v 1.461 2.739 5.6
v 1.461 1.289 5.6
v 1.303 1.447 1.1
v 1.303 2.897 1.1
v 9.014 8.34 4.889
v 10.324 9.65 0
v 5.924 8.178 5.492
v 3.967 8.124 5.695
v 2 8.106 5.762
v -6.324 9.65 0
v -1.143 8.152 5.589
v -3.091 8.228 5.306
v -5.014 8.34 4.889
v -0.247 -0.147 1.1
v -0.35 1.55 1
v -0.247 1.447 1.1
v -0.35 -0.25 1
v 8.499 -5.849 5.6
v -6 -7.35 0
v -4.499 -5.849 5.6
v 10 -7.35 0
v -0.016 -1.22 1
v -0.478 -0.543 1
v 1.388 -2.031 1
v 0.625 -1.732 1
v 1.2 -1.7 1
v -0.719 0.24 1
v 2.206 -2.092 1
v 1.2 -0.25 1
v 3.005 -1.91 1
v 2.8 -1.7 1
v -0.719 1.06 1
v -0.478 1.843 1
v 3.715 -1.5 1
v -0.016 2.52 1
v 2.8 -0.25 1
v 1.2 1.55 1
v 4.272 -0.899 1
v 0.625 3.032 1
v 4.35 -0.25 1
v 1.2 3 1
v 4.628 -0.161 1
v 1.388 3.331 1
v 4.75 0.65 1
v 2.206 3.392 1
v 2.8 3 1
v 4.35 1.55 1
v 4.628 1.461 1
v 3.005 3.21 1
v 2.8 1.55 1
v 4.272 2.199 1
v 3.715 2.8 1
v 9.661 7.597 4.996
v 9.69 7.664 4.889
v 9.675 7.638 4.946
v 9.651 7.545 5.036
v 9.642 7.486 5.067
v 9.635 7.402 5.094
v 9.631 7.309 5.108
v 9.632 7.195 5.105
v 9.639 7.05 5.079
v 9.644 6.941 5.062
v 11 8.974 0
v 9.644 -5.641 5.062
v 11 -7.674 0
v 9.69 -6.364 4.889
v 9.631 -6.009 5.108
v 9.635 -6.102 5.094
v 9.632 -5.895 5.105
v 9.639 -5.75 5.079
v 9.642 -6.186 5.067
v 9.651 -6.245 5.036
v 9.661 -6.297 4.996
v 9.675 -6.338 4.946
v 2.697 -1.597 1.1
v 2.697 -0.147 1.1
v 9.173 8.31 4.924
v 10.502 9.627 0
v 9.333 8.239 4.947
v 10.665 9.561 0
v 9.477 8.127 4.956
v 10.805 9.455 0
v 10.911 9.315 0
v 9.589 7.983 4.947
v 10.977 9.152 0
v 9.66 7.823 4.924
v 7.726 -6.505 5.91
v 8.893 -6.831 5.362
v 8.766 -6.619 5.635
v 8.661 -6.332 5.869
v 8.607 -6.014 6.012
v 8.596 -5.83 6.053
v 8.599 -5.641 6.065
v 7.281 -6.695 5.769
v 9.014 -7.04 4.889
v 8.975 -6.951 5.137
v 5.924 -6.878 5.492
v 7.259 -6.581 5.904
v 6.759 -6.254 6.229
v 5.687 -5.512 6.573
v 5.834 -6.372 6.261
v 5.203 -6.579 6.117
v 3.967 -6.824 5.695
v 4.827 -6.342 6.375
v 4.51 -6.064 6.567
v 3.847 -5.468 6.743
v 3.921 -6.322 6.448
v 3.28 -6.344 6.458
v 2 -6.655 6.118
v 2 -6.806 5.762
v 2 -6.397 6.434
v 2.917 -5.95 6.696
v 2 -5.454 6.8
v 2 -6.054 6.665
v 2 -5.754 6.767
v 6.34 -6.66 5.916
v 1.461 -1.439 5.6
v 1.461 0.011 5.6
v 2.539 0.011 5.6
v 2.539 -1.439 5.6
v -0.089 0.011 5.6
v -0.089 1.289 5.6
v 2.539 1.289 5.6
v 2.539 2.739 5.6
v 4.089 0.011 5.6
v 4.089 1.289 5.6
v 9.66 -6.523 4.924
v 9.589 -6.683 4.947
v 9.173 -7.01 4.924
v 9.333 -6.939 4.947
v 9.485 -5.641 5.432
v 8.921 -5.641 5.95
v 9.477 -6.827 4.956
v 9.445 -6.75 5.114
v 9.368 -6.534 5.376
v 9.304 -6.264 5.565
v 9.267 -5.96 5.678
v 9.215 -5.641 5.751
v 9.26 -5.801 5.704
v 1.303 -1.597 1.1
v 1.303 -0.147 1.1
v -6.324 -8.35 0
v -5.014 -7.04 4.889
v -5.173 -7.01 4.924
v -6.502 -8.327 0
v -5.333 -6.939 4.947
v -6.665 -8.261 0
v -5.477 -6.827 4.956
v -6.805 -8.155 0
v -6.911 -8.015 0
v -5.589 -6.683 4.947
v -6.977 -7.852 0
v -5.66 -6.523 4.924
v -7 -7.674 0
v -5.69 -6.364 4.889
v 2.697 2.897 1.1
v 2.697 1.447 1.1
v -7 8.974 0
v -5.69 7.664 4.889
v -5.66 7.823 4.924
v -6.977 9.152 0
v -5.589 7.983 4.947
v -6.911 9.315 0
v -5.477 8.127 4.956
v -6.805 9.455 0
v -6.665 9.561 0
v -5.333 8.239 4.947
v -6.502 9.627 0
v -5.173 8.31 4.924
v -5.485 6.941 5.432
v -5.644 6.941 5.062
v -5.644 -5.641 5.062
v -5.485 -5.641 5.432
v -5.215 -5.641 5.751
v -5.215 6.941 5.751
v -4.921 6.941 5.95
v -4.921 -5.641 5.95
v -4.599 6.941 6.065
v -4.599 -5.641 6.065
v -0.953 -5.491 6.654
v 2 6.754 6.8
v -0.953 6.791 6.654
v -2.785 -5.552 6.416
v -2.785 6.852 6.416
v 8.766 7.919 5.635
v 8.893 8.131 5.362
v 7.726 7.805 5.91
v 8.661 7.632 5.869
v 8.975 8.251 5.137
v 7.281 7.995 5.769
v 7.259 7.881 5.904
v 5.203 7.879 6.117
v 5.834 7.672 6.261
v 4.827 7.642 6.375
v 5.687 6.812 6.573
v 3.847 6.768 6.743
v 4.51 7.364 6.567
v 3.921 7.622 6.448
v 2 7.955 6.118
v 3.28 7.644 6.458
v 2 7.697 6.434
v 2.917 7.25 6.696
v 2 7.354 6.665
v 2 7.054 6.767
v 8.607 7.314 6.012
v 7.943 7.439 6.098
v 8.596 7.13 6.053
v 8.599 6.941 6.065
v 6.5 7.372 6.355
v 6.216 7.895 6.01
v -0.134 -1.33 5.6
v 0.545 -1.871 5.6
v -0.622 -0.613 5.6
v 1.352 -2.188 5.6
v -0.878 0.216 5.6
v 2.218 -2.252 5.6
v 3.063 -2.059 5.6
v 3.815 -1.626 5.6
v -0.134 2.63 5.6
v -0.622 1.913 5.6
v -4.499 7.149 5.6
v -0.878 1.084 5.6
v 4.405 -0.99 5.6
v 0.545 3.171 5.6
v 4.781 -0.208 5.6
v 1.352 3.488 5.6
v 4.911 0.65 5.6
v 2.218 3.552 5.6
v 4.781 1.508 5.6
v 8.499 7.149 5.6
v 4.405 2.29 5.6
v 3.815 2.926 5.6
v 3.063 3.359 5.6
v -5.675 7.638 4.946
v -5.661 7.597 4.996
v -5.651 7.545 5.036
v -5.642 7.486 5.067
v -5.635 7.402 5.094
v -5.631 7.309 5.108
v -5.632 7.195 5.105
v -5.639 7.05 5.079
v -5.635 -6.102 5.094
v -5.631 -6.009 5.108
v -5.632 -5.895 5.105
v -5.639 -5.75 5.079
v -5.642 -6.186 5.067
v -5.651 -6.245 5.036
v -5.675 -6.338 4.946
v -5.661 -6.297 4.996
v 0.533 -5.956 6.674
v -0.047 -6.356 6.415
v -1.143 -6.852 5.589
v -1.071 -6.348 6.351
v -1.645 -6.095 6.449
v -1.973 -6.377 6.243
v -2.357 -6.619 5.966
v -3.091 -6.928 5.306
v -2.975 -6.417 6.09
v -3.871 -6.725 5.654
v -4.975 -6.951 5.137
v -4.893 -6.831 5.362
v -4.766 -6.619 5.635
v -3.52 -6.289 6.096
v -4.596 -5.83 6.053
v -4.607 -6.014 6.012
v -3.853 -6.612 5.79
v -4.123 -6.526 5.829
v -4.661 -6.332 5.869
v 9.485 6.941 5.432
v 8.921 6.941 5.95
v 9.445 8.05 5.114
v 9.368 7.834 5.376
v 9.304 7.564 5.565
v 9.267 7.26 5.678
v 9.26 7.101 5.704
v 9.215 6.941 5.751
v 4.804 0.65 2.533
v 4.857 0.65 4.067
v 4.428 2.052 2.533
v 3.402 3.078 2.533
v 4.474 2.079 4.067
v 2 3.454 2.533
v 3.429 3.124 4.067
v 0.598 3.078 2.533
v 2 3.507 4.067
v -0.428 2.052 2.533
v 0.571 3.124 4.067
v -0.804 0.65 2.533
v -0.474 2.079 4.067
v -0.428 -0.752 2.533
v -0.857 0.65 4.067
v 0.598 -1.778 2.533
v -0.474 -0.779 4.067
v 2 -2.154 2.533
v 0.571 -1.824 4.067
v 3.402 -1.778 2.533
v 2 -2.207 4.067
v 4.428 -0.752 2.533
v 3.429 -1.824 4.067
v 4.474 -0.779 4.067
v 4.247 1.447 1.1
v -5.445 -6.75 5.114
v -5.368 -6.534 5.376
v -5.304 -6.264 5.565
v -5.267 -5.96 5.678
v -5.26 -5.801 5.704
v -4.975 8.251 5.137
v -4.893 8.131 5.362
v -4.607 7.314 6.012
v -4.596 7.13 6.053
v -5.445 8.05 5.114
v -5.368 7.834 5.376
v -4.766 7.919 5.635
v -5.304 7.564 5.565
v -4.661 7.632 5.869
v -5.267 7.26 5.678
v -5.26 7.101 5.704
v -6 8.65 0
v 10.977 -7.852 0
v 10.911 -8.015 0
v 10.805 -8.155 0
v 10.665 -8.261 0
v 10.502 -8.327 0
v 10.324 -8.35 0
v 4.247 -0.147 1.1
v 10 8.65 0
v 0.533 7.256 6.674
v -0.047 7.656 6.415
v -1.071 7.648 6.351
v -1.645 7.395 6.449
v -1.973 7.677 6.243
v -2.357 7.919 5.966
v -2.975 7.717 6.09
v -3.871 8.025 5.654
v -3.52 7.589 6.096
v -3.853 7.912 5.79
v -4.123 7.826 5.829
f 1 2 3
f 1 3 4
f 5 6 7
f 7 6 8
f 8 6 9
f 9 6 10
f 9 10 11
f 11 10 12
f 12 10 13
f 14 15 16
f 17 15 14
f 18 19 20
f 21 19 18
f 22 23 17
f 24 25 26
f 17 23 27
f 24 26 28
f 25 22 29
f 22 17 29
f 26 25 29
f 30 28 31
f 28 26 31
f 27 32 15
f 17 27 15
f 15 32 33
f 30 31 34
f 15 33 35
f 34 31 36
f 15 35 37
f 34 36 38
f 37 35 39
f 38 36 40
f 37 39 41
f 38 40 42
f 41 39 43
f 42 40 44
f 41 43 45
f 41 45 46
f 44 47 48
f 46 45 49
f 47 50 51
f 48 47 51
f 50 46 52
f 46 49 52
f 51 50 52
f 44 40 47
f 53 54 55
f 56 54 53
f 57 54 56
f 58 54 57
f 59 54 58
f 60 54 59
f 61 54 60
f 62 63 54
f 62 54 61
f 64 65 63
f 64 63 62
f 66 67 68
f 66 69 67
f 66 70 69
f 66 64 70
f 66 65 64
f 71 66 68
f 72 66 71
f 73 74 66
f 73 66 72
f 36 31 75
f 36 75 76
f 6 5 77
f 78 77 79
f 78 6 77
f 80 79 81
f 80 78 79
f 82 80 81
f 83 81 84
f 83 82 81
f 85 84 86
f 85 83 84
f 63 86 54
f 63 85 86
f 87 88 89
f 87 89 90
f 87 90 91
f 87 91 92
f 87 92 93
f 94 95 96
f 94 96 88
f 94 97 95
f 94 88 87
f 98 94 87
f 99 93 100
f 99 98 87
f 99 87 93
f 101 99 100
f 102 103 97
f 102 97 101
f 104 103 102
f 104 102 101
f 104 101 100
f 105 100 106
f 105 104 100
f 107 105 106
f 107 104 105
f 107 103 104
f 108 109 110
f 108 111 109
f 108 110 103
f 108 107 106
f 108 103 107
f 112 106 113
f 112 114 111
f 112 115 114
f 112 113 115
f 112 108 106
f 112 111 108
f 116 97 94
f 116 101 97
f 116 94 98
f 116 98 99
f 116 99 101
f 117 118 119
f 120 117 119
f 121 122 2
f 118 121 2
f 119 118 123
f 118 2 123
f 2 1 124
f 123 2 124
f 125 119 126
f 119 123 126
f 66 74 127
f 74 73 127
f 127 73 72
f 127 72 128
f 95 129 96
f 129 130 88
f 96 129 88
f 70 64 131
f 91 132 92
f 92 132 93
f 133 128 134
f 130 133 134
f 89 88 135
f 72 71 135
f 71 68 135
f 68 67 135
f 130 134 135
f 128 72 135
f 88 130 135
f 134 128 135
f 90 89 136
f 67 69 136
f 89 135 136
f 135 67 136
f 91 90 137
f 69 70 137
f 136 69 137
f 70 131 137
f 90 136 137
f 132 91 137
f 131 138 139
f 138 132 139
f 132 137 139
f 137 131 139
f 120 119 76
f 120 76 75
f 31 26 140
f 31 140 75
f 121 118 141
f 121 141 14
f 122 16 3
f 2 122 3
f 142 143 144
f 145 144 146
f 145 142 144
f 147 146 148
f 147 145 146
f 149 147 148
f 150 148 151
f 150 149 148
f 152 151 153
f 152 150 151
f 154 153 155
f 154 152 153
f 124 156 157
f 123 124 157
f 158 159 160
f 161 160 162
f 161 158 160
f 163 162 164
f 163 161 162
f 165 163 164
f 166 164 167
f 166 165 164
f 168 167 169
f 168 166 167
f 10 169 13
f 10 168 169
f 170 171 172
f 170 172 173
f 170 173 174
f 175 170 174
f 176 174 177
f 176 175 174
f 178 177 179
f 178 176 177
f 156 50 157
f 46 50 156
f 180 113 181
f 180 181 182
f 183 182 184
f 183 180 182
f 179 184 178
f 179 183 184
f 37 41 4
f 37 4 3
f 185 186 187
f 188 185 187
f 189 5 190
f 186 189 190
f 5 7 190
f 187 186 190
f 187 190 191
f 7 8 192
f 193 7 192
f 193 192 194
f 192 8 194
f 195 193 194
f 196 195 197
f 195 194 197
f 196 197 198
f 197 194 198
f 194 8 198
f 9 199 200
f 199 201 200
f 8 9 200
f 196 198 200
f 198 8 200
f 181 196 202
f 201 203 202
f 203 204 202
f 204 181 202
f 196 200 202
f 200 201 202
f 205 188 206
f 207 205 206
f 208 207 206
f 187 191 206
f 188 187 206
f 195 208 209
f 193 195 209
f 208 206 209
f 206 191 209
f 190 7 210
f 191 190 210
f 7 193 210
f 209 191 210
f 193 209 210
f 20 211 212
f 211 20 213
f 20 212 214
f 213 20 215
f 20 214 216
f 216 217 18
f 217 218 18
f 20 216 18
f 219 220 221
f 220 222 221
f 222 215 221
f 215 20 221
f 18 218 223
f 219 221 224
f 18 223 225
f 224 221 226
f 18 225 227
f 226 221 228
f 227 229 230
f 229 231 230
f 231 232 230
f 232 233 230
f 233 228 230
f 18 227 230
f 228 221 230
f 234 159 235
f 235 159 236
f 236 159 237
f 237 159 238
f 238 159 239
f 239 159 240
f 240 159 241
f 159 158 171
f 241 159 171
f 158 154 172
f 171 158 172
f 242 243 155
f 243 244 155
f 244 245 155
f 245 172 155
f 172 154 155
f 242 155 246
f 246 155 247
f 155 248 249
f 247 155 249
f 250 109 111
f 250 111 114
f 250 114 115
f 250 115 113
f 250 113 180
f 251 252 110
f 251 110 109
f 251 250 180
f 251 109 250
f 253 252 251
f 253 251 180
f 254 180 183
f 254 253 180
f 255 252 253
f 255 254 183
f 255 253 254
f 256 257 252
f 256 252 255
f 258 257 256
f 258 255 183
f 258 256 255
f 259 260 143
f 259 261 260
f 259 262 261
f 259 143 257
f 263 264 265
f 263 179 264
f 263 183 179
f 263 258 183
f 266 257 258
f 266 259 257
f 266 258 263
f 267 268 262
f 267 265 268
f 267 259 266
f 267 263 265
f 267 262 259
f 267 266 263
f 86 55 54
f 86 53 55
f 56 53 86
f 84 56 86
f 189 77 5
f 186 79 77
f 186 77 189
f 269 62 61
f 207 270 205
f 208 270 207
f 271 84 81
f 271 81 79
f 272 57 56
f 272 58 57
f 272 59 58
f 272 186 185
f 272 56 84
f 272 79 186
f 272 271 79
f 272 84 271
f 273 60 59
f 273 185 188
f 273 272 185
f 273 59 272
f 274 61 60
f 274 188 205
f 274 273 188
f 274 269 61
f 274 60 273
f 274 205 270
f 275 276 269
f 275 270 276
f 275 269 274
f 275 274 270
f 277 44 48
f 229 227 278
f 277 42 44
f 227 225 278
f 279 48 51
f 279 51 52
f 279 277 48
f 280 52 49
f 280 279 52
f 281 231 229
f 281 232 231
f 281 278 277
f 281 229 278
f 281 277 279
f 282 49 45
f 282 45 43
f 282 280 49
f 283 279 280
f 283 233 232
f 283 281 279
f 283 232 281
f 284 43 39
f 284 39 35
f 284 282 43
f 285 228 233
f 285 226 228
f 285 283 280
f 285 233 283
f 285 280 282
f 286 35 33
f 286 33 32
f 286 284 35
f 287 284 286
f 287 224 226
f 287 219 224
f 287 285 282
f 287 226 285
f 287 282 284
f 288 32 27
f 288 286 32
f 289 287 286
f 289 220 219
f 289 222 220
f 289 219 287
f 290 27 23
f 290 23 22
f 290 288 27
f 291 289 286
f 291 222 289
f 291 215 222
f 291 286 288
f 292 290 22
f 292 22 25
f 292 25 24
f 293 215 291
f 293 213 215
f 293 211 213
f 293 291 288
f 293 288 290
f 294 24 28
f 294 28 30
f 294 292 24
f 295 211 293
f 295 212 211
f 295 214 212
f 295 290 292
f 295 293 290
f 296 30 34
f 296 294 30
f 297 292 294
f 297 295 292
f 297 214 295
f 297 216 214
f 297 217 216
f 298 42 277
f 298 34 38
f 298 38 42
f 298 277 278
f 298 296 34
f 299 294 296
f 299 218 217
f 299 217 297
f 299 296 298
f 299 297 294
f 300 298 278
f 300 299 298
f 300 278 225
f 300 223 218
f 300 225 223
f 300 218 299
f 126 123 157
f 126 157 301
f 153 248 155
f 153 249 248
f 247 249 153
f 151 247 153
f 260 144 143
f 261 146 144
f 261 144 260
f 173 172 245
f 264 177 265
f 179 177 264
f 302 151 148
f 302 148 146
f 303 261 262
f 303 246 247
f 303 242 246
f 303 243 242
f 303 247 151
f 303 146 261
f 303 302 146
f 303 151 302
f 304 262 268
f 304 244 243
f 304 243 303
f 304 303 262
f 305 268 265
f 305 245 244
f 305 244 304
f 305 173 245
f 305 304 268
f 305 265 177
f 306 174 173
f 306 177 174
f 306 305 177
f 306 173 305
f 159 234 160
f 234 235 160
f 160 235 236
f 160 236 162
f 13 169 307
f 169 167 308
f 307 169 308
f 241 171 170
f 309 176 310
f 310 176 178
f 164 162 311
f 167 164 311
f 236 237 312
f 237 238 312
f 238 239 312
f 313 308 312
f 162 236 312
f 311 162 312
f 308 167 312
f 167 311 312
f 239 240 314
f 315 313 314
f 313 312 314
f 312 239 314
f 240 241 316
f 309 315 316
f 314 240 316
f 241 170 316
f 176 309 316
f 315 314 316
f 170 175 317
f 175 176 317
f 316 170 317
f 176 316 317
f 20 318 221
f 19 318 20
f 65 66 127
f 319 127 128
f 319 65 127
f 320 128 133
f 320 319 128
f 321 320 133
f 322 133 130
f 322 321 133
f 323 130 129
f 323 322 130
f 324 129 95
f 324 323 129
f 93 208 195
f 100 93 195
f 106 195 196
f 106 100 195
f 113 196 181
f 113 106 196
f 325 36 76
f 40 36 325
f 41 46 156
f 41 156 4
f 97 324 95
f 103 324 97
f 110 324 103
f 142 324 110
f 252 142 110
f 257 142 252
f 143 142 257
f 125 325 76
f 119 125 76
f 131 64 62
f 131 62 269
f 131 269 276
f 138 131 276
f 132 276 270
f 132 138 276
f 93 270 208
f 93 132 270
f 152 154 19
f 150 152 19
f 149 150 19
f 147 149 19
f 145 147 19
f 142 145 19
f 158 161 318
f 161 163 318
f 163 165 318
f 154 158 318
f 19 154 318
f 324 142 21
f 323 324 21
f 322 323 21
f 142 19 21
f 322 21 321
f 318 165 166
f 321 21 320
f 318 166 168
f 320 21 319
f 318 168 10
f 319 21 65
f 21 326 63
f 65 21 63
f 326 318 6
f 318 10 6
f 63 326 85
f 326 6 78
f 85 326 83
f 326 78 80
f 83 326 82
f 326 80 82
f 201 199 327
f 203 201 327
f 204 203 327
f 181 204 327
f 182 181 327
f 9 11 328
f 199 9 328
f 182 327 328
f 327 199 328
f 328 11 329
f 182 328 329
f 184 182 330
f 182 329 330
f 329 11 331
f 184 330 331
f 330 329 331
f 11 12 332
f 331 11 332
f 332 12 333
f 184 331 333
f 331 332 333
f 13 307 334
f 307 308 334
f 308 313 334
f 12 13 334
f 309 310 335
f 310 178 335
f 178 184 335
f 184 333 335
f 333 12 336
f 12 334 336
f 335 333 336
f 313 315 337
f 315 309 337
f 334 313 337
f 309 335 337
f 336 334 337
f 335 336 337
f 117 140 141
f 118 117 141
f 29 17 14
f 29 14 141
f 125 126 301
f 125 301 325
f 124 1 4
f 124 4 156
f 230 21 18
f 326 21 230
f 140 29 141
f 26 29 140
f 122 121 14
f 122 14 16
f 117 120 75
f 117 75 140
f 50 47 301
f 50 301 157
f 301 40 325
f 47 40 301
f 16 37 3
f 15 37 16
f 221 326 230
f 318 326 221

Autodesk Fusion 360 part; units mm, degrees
sketch "Stem dimensions" plane through (0, 0, 0) normal (0, 0, 1) x (1, 0, 0)
  line L0 (0, 0) -> (4, 0)
  line L1 (4, 0) -> (4, 1.3)
  line L2 (4, 1.3) -> (0, 1.3)
  line L3 (0, 1.3) -> (0, 0)
  line L4 (1.45, 2.65) -> (2.55, 2.65)
  line L5 (2.55, 2.65) -> (2.55, -1.35)
  line L6 (2.55, -1.35) -> (1.45, -1.35)
  line L7 (1.45, -1.35) -> (1.45, 2.65)
  line L8 (0, 1.3) -> (4, 0) construction
  line L9 (0, 0) -> (4, 1.3) construction
  line L10 (2, -1.35) -> (2, 2.65) construction
  line L11 (2.55, 0.65) -> (1.45, 0.65) construction
  point P0 (2, 0.65)
  point P1 (2, 0.65)
  point P2 (2, 0.65)
  dimension "d1" = 4
  dimension "d2" = 1.3
  dimension "d3" = 1.1
  dimension "d4" = 4
sketch "Stem clearance" plane through (0, 0, 0) normal (0, 0, 1) x (1, 0, 0)
  line L0 (4, 1.3) -> (0, 1.3) construction
  line L1 (1.45, -1.35) -> (1.45, 2.65) construction
  line L2 (1.45, 2.65) -> (2.55, 2.65) construction
  line L3 (2.55, 2.65) -> (2.55, -1.35) construction
  line L4 (4, 0) -> (4, 1.3) construction
  line L5 (0, 0) -> (4, 0) construction
  line L6 (2.55, -1.35) -> (1.45, -1.35) construction
  line L7 (0, 1.3) -> (0, 0) construction
  line L8 (-0.25, 1.45) -> (1.3, 1.45)
  line L9 (1.3, 1.45) -> (1.3, 2.9)
  line L10 (1.3, 2.9) -> (2.7, 2.9)
  line L11 (2.7, 2.9) -> (2.7, 1.45)
  line L12 (2.7, 1.45) -> (4.25, 1.45)
  line L13 (4.25, 1.45) -> (4.25, -0.15)
  line L14 (4.25, -0.15) -> (2.7, -0.15)
  line L15 (2.7, -0.15) -> (2.7, -1.6)
  line L16 (2.7, -1.6) -> (1.3, -1.6)
  line L17 (1.3, -1.6) -> (1.3, -0.15)
  line L18 (1.3, -0.15) -> (-0.25, -0.15)
  line L19 (-0.25, -0.15) -> (-0.25, 1.45)
  circle A0 centre (2, 0.65) radius 2.75
  point P0 (2, 0.65)
  dimension "gap" = 0.15
  dimension "gap_edge" = 0.25
  dimension "d7" = 0.15
  dimension "d8" = 0.25
  dimension "d9" = 0.25
  dimension "d10" = 0.25
  dimension "d11" = 0.15
  dimension "d12" = 0.15
  dimension "d13" = 5.5
ref_plane "WorkPlane1" through (2, 0.65, 0) normal (1, 0, 0) x (0, 1, 0)
sketch "Stem - vertical" plane through (2, 0, 0) normal (1, 0, 0) x (0, 1, 0)
  line L0 (-1.35, 0) -> (2.65, 0) construction
  line L1 (0.65, 0) -> (0.65, 5.6)
  point P0 (0.65, 1)
  point P1 (0.65, 0)
  dimension "d16" = 1
  dimension "d28" = 4.6
extrude "Extrude1" add sketch "Stem clearance" along normal up to surface (4.6 mm away) draft 2 from surface at 1 makes body 1
chamfer "Chamfer1" distance 0.1 angle 45 12 edges at (1.3, -0.875, 1) (2, -1.6, 1) (2.7, -0.875, 1) (3.475, -0.15, 1) (4.25, 0.65, 1) (3.475, 1.45, 1) (2.7, 2.175, 1) (2, 2.9, 1) (1.3, 2.175, 1) (0.525, 1.45, 1) (-0.25, 0.65, 1) (0.525, -0.15, 1) on bodies 1
sketch "Keycap bottom" plane through (0, 0, 0) normal (0, 0, 1) x (1, 0, 0)
  line L0 (2.55, 0.65) -> (1.45, 0.65) construction
  line L1 (2, -1.35) -> (2, 2.65) construction
  line L2 (-7, -8.35) -> (11, -8.35)
  line L3 (11, -8.35) -> (11, 9.65)
  line L4 (11, 9.65) -> (-7, 9.65)
  line L5 (-7, 9.65) -> (-7, -8.35)
  line L6 (-7, 9.65) -> (11, -8.35) construction
  line L7 (11, 9.65) -> (-7, -8.35) construction
  line L8 (-6, -7.35) -> (10, -7.35)
  line L9 (10, -7.35) -> (10, 8.65)
  line L10 (10, 8.65) -> (-6, 8.65)
  line L11 (-6, 8.65) -> (-6, -7.35)
  point P0 (2, 0.65)
  point P1 (2, 0.65)
  dimension "keycap_size" = 18
  dimension "d21" = 18
  dimension "d29" = 16
ref_plane "WorkPlane2" through (2, 0.65, 0) normal (0, 1, 0) x (-1, 0, 0)
extrude "Extrude2" add sketch "Keycap bottom" along normal blind 12 separate body contours L2 L3 L4 L5 | L8 L9 L10 L11 makes body 2
sketch "Keycap front-back profile" plane through (0, 0.65, 0) normal (0, 1, 0) x (1, 0, 0)
  line L0 (4.9106, -5.6) -> (-0.9106, -5.6) construction
  line L1 (-7, 0) -> (11, 0)
  line L2 (2, -5.6) -> (2, 23.2) construction
  arc A0 (-17.02, 0) -> (2, -6.8) centre (2, 23.2) ccw
  line L3 (-7, 0) -> (-5.4283, -5.8658)
  arc A1 (2, -6.8) -> (21.02, 0) centre (2, 23.2) ccw
  line L4 (11, 0) -> (9.4283, -5.8658)
  point P0 (-6, 0)
  point P1 (10, 0)
  dimension "d31" = 1.2
  dimension "d32" = 75
  dimension "d46" = 30
extrude "Extrude4" cut sketch "Keycap front-back profile" along normal through all and the other way through all keep common part bodies 2 1
sketch "Keycap left-right profile" plane through (2, 0, 0) normal (1, 0, 0) x (0, 1, 0)
  line L0 (-8.35, 0) -> (9.65, 0)
  line L1 (-2.2606, 5.6) -> (3.5606, 5.6) construction
  line L2 (-8.35, 0) -> (-6.5279, 6.8)
  line L3 (-6.5279, 6.8) -> (0.65, 6.8)
  line L4 (0.65, 5.6) -> (0.65, -23.2)
  line L5 (7.8279, 6.8) -> (0.65, 6.8)
  line L6 (9.65, 0) -> (7.8279, 6.8)
  point P0 (8.65, 0)
  point P1 (-7.35, 0)
  point P2 (0.65, 6.8)
  dimension "d40" = 75
extrude "Extrude5" cut sketch "Keycap left-right profile" along normal through all and the other way through all keep common part bodies 2 1
fillet "Fillet1" radius 1.4 4 edges at (9.4283, 0.65, 5.8658) (-5.4283, 0.65, 5.8658) (2, 7.8279, 6.8) (2, -6.5279, 6.8) on bodies 2
fillet "Fillet1" radius 0.7 4 edges at (10.2141, 8.8641, 2.9329) (-6.2141, 8.8641, 2.9329) (-6.2141, -7.5641, 2.9329) (10.2141, -7.5641, 2.9329) on bodies 2
extrude "Extrude3" cut sketch "Keycap bottom" along normal up to surface (5.6 mm away) draft -15 contours L8 L9 L10 L11 bodies 2
combine "Combine1" operation add target body 2 tool bodies 1
equation "d7 = gap"
equation "d8 = gap_edge"
equation "d9 = gap_edge"
equation "d10 = gap_edge"
equation "d11 = gap"
equation "d12 = gap"
equation "d21 = keycap_size"
equation "d28 = 4 mm + 0.6 mm"
equation "d40 = d32"
